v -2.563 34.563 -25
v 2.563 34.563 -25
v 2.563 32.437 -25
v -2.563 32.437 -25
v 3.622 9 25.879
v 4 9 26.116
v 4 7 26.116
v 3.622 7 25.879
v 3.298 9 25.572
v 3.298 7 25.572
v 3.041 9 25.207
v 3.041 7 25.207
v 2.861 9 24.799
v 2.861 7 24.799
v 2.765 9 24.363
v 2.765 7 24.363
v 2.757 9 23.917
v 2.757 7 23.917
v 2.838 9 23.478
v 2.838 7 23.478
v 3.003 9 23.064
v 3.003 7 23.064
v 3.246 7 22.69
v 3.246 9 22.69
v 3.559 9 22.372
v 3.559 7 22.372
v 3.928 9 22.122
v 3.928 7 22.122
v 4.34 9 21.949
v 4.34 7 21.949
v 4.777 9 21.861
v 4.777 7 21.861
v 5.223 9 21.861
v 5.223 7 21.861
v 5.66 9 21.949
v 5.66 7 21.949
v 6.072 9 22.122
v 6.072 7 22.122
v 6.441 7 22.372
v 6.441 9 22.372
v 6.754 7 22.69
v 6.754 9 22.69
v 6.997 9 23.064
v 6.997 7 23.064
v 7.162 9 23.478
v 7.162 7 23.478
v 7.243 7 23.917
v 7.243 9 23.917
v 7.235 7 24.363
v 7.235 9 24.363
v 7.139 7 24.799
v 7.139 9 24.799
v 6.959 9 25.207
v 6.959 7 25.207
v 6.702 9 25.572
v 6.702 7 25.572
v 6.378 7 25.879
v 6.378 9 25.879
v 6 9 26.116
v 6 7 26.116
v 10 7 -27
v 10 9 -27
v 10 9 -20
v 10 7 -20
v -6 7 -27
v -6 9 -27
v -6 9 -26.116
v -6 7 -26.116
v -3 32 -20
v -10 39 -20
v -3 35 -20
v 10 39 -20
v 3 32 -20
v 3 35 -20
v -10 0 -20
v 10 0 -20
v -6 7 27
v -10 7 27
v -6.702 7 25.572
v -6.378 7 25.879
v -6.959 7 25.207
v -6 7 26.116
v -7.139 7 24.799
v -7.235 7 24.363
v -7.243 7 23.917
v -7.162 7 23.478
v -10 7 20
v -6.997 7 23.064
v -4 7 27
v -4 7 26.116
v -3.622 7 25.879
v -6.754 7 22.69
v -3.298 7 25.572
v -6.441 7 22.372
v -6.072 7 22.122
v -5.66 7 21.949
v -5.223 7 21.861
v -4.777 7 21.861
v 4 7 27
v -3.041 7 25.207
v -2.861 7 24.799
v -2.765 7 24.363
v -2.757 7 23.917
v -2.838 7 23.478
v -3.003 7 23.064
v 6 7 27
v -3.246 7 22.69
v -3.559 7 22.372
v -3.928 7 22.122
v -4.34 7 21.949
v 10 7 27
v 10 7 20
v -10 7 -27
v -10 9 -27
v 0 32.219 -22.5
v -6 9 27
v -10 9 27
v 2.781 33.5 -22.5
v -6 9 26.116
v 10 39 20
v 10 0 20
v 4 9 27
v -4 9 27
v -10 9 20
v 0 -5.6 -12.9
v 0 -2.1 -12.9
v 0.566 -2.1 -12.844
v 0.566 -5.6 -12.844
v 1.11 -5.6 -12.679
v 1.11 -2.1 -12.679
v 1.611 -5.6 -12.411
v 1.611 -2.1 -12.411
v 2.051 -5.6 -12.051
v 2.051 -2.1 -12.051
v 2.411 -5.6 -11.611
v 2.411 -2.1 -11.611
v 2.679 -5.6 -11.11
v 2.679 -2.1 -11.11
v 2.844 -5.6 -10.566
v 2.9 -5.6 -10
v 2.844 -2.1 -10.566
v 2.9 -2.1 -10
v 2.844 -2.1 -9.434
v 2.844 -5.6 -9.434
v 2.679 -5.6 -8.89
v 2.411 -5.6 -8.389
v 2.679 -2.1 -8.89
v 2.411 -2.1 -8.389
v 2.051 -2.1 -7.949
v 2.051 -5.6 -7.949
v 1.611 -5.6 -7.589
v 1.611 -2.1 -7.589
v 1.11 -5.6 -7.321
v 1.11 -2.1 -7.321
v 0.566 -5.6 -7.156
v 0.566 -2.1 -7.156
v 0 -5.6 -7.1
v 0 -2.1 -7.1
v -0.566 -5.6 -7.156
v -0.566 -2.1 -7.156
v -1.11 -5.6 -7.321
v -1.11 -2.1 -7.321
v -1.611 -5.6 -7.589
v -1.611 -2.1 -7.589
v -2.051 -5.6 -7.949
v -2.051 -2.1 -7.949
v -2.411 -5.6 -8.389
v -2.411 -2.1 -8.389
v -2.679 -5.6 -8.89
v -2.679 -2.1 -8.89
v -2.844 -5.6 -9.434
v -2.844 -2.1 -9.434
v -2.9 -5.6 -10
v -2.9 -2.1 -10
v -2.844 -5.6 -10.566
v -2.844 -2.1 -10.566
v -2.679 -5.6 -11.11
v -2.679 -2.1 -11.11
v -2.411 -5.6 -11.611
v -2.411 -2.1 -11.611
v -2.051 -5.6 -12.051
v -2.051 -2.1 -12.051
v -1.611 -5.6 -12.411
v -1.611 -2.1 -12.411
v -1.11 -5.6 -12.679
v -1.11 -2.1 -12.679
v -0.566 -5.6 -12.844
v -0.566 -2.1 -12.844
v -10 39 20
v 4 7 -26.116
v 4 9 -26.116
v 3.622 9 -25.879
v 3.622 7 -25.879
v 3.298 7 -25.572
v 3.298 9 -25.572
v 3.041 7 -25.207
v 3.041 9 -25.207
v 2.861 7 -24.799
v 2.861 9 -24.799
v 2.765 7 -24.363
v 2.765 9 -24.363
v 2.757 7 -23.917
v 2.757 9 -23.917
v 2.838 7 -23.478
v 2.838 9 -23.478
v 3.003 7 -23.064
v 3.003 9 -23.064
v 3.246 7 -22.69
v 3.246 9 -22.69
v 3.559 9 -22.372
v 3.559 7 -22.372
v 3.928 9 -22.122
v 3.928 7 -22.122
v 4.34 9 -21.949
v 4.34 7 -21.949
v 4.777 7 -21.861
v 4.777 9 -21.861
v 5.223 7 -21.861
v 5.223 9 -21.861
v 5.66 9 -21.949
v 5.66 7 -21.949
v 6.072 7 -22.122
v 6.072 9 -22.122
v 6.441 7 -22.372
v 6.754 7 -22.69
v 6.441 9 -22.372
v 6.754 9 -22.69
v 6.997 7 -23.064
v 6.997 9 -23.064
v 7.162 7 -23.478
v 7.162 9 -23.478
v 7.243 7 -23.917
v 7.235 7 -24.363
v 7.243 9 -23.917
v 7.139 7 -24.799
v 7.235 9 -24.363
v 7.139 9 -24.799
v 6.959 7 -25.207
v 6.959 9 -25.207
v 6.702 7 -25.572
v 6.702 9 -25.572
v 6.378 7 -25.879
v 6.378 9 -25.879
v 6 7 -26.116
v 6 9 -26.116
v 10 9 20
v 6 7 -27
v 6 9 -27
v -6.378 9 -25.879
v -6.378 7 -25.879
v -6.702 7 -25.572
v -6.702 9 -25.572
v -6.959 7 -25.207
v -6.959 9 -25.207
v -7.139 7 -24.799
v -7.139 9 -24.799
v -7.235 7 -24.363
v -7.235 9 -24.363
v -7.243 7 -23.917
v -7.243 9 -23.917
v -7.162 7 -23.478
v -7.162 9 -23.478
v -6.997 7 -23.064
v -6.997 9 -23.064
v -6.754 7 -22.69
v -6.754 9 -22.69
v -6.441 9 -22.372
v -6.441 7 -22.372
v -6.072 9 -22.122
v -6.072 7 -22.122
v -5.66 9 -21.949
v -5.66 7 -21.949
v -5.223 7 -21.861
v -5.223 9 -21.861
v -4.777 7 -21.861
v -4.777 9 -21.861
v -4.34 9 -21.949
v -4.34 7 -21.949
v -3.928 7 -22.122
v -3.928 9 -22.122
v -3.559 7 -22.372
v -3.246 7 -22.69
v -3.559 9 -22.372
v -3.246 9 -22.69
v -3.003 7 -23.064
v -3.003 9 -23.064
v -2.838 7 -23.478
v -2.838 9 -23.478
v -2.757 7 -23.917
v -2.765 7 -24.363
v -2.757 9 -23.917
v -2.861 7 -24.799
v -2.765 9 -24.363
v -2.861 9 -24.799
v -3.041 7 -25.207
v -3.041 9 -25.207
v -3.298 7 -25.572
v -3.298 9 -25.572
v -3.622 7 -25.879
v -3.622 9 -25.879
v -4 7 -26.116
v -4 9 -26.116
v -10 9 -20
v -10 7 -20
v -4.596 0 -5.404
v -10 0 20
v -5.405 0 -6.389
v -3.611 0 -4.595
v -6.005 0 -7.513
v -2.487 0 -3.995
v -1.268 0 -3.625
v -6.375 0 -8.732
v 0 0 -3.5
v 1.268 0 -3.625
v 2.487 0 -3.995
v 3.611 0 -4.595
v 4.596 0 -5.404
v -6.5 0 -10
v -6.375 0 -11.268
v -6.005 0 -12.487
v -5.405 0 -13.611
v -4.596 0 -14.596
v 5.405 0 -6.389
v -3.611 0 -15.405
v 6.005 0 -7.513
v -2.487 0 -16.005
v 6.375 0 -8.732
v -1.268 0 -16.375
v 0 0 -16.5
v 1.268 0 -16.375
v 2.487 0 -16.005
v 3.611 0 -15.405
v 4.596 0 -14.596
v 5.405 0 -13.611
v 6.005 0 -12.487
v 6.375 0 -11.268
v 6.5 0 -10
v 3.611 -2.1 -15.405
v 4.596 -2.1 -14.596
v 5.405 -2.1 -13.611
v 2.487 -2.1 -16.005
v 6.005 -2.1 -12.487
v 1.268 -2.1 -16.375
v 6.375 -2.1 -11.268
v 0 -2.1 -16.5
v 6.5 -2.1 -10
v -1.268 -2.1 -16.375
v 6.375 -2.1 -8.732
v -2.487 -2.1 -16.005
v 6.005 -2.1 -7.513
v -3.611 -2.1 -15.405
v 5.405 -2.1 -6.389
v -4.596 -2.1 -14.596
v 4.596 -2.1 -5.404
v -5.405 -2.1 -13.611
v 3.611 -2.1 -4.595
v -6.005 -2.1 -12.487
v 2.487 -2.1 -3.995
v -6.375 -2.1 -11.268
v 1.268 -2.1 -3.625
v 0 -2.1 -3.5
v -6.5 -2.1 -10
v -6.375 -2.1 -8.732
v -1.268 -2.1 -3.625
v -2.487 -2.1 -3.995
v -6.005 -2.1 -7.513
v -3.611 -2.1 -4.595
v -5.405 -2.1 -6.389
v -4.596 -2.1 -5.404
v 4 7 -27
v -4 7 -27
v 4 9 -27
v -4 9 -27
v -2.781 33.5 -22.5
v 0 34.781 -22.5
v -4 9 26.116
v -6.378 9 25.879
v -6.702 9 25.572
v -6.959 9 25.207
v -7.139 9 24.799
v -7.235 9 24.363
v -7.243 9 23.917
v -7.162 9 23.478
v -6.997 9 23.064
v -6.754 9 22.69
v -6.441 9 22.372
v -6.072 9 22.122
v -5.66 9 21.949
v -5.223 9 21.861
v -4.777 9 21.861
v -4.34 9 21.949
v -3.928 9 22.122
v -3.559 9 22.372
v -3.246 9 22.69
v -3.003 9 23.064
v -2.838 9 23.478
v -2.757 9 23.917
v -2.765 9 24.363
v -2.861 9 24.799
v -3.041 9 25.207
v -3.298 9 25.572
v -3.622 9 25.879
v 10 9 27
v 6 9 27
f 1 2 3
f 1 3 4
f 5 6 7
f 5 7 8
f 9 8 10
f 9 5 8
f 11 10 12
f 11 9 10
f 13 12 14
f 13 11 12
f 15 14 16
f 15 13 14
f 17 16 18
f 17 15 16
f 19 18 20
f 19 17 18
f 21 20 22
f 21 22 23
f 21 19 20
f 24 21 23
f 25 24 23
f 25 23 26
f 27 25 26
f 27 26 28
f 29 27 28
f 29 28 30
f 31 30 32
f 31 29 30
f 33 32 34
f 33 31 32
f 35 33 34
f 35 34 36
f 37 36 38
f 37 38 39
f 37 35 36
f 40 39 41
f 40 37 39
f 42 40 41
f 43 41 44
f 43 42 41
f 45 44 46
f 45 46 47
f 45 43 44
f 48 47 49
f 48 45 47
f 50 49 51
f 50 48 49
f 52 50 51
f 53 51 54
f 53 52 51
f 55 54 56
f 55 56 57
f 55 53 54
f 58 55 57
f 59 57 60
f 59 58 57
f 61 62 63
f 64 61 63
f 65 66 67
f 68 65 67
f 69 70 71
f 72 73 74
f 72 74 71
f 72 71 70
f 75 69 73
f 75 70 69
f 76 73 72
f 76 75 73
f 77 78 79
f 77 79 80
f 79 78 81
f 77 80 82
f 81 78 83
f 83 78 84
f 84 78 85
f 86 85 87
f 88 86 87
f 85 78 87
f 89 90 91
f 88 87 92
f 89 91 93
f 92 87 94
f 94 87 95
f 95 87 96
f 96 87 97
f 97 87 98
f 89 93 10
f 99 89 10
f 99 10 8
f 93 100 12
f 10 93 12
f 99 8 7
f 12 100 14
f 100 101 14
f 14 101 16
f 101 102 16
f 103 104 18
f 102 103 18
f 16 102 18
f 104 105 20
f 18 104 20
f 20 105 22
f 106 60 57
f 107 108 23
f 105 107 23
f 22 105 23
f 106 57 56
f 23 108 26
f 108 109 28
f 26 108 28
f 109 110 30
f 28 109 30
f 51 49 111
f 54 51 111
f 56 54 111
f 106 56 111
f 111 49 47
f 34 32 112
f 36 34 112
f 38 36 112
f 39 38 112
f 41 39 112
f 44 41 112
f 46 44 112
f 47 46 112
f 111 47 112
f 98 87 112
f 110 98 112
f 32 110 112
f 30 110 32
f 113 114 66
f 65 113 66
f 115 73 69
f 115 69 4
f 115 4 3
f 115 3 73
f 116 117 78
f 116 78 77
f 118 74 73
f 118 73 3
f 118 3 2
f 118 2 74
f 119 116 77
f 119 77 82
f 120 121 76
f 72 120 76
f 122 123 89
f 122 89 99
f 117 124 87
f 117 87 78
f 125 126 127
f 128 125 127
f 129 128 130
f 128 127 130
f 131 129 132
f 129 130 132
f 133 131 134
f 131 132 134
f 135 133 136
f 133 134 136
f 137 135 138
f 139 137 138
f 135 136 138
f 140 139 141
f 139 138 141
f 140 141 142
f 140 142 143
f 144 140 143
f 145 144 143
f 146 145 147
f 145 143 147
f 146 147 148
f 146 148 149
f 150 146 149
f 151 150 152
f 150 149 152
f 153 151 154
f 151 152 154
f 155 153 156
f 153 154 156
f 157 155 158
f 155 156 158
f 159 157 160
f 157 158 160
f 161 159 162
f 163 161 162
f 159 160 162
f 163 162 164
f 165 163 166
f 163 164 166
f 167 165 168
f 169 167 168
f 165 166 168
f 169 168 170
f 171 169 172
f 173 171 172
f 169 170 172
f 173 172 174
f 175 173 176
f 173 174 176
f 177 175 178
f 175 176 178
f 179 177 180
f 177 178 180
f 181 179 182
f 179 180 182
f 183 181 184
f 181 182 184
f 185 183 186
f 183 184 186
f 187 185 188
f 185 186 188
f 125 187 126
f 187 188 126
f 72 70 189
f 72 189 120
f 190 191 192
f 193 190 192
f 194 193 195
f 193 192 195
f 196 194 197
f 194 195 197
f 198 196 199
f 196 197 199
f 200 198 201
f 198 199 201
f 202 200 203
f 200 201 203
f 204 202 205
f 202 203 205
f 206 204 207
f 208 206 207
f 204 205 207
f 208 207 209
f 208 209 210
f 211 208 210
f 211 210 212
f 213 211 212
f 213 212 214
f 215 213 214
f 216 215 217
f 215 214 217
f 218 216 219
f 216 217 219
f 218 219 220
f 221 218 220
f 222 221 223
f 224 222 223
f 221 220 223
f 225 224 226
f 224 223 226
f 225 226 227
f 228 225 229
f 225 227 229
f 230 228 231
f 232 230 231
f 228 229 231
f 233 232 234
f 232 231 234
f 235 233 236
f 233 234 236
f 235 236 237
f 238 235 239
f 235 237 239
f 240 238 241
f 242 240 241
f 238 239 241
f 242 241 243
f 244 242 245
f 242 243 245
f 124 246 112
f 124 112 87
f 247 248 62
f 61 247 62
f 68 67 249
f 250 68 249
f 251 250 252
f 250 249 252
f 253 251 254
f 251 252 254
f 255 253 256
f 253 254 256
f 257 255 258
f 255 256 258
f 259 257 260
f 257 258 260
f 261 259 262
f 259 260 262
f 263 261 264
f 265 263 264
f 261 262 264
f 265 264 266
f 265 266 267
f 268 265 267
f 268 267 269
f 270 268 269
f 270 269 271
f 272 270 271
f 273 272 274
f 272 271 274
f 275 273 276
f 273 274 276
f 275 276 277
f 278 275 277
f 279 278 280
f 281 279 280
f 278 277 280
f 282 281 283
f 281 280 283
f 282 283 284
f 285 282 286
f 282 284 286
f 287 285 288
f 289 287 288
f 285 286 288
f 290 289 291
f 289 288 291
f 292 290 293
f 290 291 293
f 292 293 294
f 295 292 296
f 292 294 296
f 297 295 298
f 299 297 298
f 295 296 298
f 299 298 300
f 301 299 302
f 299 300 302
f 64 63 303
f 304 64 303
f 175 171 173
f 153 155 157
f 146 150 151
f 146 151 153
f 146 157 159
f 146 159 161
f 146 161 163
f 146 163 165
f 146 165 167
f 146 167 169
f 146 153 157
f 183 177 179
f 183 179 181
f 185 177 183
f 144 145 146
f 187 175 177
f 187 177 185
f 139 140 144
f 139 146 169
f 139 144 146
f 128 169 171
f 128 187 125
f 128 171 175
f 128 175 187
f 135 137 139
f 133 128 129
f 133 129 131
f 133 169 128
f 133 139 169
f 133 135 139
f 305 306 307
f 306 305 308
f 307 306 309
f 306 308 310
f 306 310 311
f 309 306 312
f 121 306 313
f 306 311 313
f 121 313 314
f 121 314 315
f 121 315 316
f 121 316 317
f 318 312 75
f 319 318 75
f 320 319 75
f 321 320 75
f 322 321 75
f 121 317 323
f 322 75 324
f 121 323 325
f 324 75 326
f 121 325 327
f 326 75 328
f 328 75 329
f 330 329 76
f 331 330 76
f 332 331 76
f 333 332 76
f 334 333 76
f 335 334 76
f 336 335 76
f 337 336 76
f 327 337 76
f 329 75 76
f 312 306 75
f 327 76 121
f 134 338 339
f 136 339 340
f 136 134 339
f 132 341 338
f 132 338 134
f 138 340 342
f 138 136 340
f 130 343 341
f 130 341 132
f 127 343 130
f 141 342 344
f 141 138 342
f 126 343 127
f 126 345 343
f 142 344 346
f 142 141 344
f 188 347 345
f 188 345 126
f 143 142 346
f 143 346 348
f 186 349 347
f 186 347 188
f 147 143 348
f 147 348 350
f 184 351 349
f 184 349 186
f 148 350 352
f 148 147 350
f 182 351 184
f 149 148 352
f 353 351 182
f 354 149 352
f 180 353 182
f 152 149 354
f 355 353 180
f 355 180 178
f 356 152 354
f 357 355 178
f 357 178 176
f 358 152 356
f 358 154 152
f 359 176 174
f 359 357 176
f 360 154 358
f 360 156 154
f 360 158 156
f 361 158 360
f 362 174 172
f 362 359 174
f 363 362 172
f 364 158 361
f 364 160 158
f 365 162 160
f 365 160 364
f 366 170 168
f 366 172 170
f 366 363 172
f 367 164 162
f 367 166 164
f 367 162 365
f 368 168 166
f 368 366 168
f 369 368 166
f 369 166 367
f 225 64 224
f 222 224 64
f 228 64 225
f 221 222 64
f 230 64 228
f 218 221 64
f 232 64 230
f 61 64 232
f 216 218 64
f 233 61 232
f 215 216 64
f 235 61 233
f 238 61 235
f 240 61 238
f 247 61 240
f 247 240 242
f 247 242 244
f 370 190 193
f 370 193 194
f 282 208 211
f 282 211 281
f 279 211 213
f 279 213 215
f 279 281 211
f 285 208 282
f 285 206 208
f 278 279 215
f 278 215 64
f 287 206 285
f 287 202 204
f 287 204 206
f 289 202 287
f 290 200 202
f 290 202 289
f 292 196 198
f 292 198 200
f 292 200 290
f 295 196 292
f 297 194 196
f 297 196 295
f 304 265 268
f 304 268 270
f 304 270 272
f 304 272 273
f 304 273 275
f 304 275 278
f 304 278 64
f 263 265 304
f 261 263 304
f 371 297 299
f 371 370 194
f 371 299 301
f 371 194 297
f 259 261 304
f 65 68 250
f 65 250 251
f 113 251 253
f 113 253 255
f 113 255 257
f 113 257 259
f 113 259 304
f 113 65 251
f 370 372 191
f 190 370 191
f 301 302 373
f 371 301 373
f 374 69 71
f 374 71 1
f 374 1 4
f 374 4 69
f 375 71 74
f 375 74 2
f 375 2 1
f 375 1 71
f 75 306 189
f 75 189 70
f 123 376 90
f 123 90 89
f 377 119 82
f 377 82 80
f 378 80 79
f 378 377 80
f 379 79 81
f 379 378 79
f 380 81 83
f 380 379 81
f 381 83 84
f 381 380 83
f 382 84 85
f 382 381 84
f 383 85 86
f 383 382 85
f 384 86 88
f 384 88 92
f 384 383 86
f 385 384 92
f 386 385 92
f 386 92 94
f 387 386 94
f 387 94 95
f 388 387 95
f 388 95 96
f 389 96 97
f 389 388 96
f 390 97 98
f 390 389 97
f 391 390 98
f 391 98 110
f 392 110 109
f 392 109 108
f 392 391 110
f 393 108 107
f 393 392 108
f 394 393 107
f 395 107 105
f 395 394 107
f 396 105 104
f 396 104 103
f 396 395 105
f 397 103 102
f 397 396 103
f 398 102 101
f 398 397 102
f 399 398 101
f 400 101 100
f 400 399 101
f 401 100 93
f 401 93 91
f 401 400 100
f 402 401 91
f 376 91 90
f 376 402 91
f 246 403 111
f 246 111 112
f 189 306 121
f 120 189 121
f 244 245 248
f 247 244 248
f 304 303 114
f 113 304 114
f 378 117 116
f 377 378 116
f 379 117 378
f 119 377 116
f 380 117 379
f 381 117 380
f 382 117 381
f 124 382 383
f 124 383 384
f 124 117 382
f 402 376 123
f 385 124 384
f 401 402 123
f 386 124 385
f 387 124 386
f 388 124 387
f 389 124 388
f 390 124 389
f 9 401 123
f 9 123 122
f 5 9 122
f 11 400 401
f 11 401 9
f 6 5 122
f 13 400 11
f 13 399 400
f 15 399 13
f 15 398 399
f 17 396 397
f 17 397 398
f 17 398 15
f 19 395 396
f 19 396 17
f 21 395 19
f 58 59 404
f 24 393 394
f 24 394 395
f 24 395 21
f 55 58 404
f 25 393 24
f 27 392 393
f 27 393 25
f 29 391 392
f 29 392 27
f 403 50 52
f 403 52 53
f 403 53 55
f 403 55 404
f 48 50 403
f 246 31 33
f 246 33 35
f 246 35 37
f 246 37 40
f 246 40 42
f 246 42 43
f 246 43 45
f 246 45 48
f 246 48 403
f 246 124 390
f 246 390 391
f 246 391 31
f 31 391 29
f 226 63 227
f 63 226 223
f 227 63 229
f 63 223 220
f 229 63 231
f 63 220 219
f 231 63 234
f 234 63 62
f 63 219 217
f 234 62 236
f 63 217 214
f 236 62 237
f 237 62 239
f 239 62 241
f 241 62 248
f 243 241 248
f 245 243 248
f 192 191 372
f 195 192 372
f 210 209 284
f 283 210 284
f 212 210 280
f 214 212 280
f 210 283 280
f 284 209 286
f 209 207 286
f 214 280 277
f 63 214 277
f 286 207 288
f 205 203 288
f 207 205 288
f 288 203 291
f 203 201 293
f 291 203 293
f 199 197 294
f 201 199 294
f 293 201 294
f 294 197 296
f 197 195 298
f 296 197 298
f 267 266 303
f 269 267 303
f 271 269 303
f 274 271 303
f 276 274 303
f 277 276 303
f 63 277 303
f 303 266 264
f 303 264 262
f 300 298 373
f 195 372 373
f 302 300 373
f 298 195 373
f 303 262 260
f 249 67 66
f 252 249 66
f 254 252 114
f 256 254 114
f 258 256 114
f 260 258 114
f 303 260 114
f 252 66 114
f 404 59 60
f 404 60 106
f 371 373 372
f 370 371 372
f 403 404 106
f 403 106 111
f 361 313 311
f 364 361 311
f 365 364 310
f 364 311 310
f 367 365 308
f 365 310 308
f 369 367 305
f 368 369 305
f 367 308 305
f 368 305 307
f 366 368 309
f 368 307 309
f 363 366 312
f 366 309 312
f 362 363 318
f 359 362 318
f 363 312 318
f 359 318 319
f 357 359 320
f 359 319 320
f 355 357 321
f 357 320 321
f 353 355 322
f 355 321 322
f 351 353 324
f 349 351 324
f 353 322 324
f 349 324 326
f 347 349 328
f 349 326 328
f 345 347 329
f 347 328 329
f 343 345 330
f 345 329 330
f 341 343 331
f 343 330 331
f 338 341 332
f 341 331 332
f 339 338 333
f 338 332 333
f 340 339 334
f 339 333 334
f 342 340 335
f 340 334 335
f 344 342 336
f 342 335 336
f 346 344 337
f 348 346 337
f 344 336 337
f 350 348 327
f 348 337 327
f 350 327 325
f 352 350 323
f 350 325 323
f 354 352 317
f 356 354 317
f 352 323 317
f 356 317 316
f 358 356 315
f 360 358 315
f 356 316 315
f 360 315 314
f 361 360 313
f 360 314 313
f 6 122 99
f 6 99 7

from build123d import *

# Parameters (mm, degrees)
SKETCH_1_W             = 20
SKETCH_1_H             = 40
EXTRUDE_1_DEPTH        = 39
SKETCH_2_R             = 6.5
EXTRUDE_2_DEPTH        = 2.1
SKETCH_3_R             = 2.9
EXTRUDE_3_DEPTH        = 3.5
SKETCH_4_W             = 6
SKETCH_4_H             = 3
EXTRUDE_4_DEPTH        = 5
EXTRUDE_4_TAPER        = 5
EXTRUDE_5_DEPTH        = 1
EXTRUDE_5_DEPTH_BACK   = 1
EXTRUDE_5_2_DEPTH      = 1
EXTRUDE_5_2_DEPTH_BACK = 1


with BuildPart() as part:
    # 草图1 → 凸台-拉伸1 (new body)
    with BuildSketch(Plane(origin=(0, 0, 0), x_dir=(1, 0, 0), z_dir=(0, 1, 0))):
        Rectangle(SKETCH_1_W, SKETCH_1_H)
    extrude(amount=EXTRUDE_1_DEPTH)

    # 草图2 → 凸台-拉伸2 (add)
    with BuildSketch(Plane.XZ):
        with Locations(Location((0, -10, 0), (0, 0, 90))):
            Circle(SKETCH_2_R)
    extrude(amount=EXTRUDE_2_DEPTH)

    # 草图3 → 凸台-拉伸3 (add)
    with BuildSketch(Plane.XZ.offset(2.1)):
        with Locations(Location((0, -10, 0), (0, 0, 270))):
            Circle(SKETCH_3_R)
    extrude(amount=EXTRUDE_3_DEPTH)

    # 草图4 → 凸台-拉伸4 (add)
    with BuildSketch(Plane(origin=(0, 0, -20), x_dir=(-1, 0, 0), z_dir=(0, 0, -1))):
        with Locations((0, 33.5)):
            Rectangle(SKETCH_4_W, SKETCH_4_H)
    extrude(amount=EXTRUDE_4_DEPTH, taper=EXTRUDE_4_TAPER)


with BuildPart() as body_2:
    # 草图5 → 凸台-拉伸5 (new, two sides: drawn at the far end of the back side and taken through both)
    with BuildSketch(Plane(origin=(0, 8, 0), x_dir=(-1, 0, 0), z_dir=(0, -1, 0)).offset(-EXTRUDE_5_DEPTH_BACK)):
        with BuildLine():
            Line((-10, -20), (10, -20))
            Line((10, -20), (10, -27))
            Line((10, -27), (6, -27))
            Line((6, -27), (6, -26.115564437))
            ThreePointArc((6, -26.115564437), (5, -21.85), (4, -26.115564437))
            Line((4, -26.115564437), (4, -27))
            Line((4, -27), (-4, -27))
            Line((-4, -27), (-4, -26.115564437))
            ThreePointArc((-4, -26.115564437), (-5, -21.85), (-6, -26.115564437))
            Line((-6, -26.115564437), (-6, -27))
            Line((-6, -27), (-10, -27))
            Line((-10, -27), (-10, -20))
        make_face()
    extrude(amount=EXTRUDE_5_DEPTH + EXTRUDE_5_DEPTH_BACK)


with BuildPart() as body_3:
    # 草图5 → Extrude 5 2 (new, two sides: drawn at the far end of the back side and taken through both)
    with BuildSketch(Plane(origin=(0, 8, 0), x_dir=(-1, 0, 0), z_dir=(0, -1, 0)).offset(-EXTRUDE_5_2_DEPTH_BACK)):
        with BuildLine():
            Line((-10, 20), (10, 20))
            Line((10, 20), (10, 27))
            Line((10, 27), (6, 27))
            Line((6, 27), (6, 26.115564437))
            ThreePointArc((6, 26.115564437), (5, 21.85), (4, 26.115564437))
            Line((4, 26.115564437), (4, 27))
            Line((4, 27), (-4, 27))
            Line((-4, 27), (-4, 26.115564437))
            ThreePointArc((-4, 26.115564437), (-5, 21.85), (-6, 26.115564437))
            Line((-6, 26.115564437), (-6, 27))
            Line((-6, 27), (-10, 27))
            Line((-10, 27), (-10, 20))
        make_face()
    extrude(amount=EXTRUDE_5_2_DEPTH + EXTRUDE_5_2_DEPTH_BACK)


solid = Compound([part.part, body_2.part, body_3.part])
